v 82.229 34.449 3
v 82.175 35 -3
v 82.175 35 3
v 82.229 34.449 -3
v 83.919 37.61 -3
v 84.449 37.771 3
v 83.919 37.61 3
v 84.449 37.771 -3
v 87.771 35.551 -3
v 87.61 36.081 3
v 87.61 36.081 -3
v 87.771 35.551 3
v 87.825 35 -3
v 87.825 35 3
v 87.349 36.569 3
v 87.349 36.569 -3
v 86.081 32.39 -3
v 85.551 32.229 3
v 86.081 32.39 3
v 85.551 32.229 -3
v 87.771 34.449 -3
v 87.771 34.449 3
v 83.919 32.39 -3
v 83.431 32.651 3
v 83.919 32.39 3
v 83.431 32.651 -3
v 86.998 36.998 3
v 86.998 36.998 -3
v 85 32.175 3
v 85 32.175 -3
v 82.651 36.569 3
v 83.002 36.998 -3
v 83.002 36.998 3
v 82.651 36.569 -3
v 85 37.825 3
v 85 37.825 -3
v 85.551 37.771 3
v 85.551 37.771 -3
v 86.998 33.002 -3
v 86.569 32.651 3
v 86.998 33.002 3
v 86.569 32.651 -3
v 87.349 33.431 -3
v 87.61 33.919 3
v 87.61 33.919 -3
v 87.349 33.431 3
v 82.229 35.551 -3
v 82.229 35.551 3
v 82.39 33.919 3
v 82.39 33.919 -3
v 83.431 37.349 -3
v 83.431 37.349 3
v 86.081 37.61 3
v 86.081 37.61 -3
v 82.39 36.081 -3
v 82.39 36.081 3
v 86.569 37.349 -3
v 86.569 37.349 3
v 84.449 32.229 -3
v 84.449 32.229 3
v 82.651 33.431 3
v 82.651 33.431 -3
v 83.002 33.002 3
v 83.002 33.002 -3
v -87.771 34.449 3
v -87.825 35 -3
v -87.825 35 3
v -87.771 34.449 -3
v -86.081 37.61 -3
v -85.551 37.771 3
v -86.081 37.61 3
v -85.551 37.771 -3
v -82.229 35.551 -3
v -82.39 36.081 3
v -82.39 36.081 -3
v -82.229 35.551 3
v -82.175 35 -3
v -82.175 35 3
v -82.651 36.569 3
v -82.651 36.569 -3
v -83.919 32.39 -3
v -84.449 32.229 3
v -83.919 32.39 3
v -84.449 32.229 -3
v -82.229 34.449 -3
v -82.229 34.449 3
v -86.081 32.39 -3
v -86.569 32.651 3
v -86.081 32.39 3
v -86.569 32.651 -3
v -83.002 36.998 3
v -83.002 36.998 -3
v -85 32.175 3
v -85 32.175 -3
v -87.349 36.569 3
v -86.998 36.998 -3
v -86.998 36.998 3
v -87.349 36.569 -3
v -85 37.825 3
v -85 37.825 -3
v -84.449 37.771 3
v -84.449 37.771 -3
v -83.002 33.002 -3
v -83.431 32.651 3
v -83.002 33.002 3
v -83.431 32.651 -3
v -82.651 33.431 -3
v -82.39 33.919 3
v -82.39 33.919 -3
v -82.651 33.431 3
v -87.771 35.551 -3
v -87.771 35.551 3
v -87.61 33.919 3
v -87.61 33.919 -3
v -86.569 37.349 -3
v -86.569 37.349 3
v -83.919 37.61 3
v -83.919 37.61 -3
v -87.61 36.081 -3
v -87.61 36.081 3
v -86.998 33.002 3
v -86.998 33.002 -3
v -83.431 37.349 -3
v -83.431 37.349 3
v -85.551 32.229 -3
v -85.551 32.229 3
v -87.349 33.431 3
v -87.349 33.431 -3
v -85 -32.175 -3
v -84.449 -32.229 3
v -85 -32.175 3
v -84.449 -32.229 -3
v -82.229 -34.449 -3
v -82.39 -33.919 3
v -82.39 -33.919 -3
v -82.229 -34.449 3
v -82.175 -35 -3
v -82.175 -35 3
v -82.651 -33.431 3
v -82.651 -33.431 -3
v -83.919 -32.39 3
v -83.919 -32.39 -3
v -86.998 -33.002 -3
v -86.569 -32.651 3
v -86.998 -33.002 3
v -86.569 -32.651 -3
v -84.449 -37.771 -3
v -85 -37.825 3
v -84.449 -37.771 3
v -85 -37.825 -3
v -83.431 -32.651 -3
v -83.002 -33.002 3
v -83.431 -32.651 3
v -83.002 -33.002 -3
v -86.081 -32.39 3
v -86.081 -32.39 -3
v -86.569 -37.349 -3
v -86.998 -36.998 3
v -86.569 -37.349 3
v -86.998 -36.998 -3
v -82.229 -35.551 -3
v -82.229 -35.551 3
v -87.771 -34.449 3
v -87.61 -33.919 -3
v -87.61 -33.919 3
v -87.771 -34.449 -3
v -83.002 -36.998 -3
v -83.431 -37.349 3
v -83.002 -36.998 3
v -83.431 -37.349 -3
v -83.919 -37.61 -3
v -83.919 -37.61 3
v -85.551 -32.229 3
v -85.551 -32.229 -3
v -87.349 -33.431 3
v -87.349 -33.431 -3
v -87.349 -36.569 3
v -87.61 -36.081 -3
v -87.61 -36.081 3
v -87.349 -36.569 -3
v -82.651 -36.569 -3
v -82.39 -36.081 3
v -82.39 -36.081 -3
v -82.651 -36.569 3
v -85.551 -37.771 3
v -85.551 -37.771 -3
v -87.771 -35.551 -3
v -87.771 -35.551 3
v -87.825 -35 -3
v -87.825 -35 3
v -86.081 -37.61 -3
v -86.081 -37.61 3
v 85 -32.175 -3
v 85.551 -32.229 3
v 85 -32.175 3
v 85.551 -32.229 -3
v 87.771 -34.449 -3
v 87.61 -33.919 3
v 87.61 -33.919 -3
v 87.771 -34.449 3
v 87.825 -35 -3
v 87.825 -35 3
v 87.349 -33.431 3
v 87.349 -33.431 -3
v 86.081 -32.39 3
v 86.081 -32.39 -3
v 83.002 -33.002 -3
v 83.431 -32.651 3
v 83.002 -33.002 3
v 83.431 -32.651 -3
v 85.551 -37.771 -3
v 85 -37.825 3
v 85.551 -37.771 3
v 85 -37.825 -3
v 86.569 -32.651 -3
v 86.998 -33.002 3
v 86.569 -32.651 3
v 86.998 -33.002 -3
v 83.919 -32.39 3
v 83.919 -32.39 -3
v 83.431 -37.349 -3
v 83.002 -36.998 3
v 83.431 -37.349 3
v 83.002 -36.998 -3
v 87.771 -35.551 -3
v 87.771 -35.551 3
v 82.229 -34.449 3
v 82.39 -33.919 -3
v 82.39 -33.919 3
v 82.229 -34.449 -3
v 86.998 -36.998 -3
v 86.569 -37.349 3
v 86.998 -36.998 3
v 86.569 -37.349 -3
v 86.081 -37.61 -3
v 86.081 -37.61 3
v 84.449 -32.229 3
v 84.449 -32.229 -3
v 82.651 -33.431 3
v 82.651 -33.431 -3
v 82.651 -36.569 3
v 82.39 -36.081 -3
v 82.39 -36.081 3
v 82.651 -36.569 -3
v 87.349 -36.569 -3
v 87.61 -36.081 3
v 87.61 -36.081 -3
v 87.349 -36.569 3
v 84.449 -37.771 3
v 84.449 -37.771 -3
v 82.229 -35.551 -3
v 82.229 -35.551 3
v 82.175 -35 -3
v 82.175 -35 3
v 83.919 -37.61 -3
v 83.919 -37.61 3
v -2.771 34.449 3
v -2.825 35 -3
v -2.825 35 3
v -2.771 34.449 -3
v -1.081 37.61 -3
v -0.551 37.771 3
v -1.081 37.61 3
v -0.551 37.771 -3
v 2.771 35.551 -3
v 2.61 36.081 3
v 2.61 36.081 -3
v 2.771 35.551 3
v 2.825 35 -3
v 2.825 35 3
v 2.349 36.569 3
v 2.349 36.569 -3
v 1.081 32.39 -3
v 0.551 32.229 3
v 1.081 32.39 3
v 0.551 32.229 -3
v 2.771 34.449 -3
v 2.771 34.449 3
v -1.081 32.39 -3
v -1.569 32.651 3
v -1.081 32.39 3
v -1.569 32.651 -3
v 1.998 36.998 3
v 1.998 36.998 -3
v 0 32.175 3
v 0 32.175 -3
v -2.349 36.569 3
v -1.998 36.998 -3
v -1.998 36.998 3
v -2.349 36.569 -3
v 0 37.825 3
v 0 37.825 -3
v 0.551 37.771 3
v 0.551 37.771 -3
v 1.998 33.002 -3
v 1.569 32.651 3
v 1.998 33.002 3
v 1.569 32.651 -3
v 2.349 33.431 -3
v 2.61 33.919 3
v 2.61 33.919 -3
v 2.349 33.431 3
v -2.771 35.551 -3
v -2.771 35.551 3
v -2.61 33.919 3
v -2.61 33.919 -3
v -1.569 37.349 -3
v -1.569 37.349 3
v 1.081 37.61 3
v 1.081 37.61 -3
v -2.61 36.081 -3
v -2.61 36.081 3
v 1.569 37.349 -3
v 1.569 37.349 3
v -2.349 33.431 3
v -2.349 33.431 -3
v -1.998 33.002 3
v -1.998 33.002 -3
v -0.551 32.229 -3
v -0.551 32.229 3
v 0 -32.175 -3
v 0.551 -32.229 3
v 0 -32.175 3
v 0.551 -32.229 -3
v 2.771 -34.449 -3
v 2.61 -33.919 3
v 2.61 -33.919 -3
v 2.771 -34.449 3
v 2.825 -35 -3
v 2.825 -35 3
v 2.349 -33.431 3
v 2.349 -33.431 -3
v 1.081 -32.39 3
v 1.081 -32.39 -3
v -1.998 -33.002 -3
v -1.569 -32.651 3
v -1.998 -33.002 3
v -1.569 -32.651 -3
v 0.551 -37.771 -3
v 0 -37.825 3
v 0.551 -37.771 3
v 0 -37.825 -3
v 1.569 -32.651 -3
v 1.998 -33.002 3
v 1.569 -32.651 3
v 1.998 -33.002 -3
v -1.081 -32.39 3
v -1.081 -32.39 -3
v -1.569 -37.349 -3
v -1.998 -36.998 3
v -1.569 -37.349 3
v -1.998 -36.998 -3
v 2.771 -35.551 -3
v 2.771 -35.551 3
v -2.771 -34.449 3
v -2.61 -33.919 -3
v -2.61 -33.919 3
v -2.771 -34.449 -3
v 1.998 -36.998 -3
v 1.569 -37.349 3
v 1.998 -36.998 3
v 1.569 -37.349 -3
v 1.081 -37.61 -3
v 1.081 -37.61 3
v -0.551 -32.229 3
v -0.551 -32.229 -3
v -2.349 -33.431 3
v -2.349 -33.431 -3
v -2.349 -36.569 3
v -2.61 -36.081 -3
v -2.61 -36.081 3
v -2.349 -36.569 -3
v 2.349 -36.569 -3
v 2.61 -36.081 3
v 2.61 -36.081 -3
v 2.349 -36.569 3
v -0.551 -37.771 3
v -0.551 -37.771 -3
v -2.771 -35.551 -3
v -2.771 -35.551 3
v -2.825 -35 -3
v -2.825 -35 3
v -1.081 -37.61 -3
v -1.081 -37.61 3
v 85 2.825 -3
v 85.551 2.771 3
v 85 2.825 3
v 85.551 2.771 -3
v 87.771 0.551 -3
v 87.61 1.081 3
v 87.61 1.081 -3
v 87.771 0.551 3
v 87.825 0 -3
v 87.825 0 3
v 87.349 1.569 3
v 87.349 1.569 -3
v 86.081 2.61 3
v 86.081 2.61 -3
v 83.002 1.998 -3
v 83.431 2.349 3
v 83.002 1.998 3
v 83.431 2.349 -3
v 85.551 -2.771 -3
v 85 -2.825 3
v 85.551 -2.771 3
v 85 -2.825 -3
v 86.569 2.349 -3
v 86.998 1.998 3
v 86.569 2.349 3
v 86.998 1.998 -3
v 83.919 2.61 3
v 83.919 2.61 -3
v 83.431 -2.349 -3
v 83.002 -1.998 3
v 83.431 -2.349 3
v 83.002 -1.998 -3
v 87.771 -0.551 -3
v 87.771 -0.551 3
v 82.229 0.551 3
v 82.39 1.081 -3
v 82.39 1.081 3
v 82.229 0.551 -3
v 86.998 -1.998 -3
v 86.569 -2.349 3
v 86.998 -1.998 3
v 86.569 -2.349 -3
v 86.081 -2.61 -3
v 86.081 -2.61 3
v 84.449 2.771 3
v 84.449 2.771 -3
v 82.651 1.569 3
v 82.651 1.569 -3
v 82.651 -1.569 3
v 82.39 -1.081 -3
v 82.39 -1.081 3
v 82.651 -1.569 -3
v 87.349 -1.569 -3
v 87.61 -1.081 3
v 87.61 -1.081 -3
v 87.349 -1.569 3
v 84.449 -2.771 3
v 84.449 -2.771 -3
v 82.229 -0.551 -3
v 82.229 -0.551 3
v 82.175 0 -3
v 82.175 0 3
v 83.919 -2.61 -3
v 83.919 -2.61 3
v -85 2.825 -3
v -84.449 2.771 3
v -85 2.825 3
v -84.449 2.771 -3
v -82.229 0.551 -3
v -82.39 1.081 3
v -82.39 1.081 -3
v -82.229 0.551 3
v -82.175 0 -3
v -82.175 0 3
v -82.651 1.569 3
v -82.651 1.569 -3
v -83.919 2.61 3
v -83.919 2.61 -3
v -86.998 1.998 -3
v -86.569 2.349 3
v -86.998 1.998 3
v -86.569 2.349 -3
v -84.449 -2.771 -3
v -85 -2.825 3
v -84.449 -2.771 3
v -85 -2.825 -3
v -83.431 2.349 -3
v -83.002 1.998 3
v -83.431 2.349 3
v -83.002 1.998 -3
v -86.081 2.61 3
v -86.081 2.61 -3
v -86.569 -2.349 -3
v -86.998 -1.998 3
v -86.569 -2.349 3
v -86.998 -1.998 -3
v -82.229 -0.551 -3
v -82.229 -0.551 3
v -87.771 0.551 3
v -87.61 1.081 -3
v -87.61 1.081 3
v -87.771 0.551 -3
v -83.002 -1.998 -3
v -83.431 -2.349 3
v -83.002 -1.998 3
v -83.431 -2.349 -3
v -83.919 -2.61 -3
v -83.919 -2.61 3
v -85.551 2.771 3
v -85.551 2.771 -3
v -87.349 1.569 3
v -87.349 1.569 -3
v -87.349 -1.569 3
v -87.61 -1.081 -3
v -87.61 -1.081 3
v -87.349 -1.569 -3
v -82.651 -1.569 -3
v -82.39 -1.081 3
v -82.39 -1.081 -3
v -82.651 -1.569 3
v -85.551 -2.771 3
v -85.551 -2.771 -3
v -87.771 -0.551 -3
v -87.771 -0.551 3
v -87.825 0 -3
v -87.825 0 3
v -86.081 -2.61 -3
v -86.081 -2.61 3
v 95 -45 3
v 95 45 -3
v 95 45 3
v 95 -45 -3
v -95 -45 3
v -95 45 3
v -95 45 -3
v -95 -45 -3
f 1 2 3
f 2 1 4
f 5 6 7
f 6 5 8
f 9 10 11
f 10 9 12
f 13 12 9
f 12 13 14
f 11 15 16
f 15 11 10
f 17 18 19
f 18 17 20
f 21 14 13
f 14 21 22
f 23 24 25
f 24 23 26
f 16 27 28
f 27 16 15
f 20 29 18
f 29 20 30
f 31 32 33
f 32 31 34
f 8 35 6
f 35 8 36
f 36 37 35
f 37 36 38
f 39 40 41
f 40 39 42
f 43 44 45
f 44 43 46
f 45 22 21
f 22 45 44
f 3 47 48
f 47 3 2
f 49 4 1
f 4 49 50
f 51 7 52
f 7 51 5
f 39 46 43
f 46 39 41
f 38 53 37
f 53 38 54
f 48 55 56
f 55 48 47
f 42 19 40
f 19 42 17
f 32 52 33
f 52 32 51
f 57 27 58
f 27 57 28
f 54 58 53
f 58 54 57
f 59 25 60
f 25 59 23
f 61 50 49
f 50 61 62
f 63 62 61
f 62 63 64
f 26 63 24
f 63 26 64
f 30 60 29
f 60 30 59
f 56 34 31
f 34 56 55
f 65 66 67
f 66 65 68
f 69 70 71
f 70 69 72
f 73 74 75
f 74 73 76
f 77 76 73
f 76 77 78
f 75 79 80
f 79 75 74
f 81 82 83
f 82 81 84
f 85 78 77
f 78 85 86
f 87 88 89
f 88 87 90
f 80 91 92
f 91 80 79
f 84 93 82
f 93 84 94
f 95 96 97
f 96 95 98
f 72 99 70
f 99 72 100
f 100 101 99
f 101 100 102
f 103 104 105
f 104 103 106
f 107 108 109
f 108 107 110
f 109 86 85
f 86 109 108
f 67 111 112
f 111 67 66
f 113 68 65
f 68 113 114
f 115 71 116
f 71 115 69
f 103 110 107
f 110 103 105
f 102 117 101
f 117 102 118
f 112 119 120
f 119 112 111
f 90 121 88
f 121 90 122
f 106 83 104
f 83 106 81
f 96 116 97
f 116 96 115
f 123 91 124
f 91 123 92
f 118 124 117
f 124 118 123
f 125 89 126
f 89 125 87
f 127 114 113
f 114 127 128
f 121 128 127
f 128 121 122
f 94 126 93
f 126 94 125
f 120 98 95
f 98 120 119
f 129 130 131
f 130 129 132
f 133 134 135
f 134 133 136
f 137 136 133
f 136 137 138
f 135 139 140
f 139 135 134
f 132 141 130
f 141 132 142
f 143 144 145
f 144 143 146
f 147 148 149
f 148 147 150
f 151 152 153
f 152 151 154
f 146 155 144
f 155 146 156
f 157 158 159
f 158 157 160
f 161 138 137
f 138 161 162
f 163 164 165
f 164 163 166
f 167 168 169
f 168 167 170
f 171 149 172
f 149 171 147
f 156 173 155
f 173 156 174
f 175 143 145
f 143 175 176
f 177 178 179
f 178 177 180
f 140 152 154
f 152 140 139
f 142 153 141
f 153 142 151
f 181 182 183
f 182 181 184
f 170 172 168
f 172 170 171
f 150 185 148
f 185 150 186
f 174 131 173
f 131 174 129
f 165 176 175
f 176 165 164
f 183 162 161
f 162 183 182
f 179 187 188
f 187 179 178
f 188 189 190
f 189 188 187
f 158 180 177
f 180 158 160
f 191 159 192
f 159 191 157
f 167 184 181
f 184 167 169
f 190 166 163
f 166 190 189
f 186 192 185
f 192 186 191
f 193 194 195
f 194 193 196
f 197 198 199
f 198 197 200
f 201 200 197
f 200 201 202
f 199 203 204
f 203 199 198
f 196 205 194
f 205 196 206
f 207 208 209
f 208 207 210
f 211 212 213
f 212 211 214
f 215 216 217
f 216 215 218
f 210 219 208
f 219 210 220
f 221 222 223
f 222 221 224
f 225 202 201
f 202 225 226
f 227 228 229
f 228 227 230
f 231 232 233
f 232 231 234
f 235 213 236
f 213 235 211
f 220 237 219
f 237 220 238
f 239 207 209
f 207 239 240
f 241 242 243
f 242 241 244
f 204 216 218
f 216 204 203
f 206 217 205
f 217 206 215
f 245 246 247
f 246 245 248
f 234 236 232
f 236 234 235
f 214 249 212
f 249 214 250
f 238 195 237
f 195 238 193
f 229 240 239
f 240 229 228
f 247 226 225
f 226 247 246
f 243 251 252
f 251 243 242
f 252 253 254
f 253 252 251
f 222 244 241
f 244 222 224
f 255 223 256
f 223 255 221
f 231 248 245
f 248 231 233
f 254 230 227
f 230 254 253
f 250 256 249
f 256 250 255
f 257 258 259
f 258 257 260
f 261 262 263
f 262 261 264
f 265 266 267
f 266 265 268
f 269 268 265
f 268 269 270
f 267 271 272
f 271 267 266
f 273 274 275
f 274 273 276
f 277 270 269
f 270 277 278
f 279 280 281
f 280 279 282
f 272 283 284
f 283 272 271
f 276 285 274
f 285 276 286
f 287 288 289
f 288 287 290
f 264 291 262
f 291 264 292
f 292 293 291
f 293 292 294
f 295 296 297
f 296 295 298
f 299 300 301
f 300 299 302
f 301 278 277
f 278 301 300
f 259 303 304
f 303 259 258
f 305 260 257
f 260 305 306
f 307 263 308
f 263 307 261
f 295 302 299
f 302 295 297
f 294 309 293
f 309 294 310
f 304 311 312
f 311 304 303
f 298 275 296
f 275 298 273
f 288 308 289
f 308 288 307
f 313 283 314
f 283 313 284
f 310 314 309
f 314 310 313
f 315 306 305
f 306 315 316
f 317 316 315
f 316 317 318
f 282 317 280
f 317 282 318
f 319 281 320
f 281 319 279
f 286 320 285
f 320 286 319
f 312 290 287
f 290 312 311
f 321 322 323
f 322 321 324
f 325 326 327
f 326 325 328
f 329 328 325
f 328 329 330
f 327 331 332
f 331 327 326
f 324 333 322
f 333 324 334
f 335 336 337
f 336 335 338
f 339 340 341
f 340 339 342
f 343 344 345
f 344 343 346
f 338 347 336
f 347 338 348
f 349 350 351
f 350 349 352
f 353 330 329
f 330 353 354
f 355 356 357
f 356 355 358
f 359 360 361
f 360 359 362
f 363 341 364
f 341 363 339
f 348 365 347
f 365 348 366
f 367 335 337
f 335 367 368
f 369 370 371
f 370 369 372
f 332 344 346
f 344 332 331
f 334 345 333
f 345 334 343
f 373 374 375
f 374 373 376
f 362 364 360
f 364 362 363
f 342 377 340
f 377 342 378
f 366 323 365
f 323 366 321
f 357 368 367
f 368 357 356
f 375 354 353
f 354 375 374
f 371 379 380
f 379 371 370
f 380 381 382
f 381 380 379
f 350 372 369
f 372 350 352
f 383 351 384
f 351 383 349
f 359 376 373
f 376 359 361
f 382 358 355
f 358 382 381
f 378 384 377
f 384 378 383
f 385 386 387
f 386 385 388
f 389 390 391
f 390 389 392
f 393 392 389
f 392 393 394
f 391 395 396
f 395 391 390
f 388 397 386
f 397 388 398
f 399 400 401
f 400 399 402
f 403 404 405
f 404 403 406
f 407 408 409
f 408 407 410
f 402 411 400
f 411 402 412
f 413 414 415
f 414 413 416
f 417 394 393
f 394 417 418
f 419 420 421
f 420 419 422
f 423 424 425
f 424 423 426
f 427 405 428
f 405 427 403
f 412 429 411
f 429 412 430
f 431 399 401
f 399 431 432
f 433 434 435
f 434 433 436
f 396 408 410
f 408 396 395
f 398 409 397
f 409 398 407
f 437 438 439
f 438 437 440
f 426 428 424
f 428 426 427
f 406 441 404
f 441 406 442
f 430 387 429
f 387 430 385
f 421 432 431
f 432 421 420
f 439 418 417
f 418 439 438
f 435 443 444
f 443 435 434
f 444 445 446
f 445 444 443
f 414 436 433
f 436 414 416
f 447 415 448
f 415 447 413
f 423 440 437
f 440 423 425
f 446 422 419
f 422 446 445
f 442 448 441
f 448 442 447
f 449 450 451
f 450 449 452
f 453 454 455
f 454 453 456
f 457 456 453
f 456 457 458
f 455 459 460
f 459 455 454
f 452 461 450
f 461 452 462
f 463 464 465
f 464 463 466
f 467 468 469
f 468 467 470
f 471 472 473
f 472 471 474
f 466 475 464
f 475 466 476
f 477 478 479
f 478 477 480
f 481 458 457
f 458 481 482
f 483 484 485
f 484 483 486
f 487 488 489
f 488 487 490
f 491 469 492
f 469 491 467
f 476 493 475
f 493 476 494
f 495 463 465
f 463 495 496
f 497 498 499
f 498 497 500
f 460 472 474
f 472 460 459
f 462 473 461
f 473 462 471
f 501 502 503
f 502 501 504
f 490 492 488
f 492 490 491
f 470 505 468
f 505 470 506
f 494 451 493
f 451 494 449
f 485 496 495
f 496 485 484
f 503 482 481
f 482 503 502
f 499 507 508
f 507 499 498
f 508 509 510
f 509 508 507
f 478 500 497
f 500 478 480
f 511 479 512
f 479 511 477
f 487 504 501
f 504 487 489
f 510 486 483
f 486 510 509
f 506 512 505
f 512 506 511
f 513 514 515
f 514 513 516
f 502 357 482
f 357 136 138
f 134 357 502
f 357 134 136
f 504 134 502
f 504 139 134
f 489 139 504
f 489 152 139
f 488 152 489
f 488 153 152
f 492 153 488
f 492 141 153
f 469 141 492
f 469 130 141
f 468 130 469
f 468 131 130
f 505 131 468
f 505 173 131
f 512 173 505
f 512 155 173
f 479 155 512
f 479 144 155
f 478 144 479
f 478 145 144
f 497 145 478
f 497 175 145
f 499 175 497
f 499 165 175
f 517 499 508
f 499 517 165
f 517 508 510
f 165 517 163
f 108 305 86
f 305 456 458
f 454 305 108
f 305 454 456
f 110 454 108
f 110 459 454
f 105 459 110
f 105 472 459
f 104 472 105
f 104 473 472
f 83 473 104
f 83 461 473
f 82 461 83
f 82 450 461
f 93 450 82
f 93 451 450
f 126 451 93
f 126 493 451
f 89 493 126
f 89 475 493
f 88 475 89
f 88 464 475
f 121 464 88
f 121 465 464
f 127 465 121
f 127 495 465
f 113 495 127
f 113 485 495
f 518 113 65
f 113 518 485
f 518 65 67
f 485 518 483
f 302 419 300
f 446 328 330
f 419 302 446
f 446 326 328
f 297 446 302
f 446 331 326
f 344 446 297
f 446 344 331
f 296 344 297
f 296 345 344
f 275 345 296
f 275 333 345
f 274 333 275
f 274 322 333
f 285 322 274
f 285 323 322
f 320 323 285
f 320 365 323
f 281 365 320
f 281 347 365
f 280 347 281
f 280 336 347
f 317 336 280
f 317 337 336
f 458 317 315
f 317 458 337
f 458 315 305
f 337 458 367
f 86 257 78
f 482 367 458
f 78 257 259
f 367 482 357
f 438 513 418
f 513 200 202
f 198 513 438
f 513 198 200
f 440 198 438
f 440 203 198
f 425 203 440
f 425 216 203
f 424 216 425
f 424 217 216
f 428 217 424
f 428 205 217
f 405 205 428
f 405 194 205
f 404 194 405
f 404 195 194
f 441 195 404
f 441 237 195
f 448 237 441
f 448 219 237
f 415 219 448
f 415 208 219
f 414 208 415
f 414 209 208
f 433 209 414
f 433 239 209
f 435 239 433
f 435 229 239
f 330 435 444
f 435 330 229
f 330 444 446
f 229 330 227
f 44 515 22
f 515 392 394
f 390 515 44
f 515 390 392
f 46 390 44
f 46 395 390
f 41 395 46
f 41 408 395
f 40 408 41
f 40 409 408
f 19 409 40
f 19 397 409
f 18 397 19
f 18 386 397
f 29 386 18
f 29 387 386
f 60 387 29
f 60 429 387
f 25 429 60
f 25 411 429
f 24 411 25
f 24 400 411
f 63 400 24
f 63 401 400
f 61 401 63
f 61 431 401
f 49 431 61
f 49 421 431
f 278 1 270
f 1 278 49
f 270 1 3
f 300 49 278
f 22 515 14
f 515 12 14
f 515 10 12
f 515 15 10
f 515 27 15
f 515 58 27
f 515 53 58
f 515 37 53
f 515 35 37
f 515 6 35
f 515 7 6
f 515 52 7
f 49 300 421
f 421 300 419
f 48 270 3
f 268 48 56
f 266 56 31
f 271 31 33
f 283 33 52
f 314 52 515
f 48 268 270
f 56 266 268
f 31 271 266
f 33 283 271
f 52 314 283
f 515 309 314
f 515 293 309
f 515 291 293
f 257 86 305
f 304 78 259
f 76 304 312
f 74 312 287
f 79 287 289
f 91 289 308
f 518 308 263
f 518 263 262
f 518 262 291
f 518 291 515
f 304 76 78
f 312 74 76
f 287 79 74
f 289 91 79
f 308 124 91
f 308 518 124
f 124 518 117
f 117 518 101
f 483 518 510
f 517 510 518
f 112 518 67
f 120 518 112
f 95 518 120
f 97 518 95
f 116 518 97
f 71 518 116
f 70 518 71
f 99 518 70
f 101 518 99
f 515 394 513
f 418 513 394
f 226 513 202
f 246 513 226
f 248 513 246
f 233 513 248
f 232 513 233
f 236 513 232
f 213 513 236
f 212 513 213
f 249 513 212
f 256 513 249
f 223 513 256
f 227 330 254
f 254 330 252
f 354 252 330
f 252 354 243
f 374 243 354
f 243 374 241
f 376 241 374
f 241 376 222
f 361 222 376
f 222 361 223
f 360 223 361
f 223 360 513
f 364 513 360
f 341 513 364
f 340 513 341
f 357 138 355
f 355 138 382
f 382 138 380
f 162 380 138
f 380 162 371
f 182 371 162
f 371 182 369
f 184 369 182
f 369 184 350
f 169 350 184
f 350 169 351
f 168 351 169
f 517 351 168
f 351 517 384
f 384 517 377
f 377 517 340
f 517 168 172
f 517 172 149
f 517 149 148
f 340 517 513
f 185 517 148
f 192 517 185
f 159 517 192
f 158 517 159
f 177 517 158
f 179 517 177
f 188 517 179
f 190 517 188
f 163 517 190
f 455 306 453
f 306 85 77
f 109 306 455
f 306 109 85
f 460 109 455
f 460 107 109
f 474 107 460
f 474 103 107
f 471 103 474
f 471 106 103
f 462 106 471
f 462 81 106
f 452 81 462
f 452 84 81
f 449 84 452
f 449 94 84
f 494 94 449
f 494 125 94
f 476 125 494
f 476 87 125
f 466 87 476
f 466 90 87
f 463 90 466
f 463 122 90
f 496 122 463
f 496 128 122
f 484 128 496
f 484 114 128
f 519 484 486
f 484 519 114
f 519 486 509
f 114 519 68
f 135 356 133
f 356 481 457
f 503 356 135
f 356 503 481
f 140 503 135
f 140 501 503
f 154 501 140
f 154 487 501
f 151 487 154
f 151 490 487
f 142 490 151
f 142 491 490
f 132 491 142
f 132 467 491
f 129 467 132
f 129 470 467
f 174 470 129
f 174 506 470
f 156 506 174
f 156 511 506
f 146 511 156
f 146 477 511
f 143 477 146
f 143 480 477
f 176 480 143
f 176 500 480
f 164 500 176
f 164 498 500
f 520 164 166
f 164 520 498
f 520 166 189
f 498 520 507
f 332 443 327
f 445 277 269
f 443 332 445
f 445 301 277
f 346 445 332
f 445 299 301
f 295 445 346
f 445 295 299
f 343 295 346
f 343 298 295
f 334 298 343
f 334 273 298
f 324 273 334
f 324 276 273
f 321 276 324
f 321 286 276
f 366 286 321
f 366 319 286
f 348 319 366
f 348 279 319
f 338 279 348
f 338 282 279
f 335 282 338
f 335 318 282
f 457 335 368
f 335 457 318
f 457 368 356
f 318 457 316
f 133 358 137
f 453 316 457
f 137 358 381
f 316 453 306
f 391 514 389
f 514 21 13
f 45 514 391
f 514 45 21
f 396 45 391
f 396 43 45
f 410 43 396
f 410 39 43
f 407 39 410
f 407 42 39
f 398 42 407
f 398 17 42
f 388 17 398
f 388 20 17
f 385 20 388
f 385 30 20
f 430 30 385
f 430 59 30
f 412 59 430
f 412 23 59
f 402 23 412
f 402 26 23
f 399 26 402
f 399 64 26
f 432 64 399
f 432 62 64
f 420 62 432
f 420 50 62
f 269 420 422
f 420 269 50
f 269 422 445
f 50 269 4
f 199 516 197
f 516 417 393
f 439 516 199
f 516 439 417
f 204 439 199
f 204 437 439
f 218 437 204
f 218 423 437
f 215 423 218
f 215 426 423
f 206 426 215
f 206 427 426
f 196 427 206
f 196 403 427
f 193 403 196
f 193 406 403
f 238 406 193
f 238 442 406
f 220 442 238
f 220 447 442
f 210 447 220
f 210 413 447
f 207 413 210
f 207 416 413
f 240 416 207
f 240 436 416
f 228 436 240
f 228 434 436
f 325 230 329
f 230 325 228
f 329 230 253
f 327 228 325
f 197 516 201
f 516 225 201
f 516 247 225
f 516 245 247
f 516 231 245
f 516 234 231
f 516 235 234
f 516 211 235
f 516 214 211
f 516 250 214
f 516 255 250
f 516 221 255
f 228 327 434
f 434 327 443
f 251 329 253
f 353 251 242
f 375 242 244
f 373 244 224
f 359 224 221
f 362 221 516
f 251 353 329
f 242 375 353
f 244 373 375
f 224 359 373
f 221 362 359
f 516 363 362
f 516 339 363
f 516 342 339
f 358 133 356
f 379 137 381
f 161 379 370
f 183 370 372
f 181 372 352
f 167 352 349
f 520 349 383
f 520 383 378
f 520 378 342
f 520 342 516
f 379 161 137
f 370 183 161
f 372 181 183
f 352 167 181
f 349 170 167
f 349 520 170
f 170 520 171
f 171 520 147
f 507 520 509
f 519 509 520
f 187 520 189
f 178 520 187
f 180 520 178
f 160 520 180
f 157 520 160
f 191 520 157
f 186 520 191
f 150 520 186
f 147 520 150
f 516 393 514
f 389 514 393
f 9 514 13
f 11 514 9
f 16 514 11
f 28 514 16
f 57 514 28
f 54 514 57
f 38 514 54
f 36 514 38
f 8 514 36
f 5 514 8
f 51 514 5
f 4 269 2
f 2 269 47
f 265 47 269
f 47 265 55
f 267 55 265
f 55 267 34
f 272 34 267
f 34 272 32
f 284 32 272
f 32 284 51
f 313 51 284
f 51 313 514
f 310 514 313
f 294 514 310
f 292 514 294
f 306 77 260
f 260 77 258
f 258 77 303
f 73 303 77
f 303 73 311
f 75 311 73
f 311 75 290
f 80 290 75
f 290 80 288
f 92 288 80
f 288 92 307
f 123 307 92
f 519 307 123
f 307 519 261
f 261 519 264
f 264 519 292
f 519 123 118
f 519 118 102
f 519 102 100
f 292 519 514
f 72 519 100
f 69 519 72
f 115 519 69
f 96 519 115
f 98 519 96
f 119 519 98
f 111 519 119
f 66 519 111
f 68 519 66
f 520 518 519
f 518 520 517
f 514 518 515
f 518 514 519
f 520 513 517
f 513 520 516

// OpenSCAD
$fn = 32;

// ----------------------------------------------------------------------
// Corner plate 190 x 90 x 6
// 8 holes, centres taken from the edge offset
// ----------------------------------------------------------------------

// --- parameters (mm) ---
plate = [190, 90, 6];    // overall size (x, y, z)
holes = 8;               // number of holes the drawing asks for
bore_d = 5.5;            // nominal hole diameter from the drawing
print_allowance = 0.15;  // clearance added for printing
edge = 10;               // hole centre offset from the plate edge

// --- derived feature positions (mm) ---
hole_d = bore_d + print_allowance;  // = 5.65   hole diameter as printed
corner_x = plate[0] / 2 - edge;     // = 85   corner hole X
corner_y = plate[1] / 2 - edge;     // = 35   corner hole Y
feature_centers = [
  [corner_x, corner_y],
  [-corner_x, corner_y],
  [-corner_x, -corner_y],
  [corner_x, -corner_y],
  [0, corner_y],
  [0, -corner_y],
  [corner_x, 0],
  [-corner_x, 0]
];   // hole centres the loop below drills

// plate outline, every hole drilled through with the same cutters
difference() {
  cube(plate, center = true);
  for (centre = feature_centers)
    translate([centre[0], centre[1], 0])
      cylinder(d = hole_d, h = plate[2] + 2, center = true);
}
